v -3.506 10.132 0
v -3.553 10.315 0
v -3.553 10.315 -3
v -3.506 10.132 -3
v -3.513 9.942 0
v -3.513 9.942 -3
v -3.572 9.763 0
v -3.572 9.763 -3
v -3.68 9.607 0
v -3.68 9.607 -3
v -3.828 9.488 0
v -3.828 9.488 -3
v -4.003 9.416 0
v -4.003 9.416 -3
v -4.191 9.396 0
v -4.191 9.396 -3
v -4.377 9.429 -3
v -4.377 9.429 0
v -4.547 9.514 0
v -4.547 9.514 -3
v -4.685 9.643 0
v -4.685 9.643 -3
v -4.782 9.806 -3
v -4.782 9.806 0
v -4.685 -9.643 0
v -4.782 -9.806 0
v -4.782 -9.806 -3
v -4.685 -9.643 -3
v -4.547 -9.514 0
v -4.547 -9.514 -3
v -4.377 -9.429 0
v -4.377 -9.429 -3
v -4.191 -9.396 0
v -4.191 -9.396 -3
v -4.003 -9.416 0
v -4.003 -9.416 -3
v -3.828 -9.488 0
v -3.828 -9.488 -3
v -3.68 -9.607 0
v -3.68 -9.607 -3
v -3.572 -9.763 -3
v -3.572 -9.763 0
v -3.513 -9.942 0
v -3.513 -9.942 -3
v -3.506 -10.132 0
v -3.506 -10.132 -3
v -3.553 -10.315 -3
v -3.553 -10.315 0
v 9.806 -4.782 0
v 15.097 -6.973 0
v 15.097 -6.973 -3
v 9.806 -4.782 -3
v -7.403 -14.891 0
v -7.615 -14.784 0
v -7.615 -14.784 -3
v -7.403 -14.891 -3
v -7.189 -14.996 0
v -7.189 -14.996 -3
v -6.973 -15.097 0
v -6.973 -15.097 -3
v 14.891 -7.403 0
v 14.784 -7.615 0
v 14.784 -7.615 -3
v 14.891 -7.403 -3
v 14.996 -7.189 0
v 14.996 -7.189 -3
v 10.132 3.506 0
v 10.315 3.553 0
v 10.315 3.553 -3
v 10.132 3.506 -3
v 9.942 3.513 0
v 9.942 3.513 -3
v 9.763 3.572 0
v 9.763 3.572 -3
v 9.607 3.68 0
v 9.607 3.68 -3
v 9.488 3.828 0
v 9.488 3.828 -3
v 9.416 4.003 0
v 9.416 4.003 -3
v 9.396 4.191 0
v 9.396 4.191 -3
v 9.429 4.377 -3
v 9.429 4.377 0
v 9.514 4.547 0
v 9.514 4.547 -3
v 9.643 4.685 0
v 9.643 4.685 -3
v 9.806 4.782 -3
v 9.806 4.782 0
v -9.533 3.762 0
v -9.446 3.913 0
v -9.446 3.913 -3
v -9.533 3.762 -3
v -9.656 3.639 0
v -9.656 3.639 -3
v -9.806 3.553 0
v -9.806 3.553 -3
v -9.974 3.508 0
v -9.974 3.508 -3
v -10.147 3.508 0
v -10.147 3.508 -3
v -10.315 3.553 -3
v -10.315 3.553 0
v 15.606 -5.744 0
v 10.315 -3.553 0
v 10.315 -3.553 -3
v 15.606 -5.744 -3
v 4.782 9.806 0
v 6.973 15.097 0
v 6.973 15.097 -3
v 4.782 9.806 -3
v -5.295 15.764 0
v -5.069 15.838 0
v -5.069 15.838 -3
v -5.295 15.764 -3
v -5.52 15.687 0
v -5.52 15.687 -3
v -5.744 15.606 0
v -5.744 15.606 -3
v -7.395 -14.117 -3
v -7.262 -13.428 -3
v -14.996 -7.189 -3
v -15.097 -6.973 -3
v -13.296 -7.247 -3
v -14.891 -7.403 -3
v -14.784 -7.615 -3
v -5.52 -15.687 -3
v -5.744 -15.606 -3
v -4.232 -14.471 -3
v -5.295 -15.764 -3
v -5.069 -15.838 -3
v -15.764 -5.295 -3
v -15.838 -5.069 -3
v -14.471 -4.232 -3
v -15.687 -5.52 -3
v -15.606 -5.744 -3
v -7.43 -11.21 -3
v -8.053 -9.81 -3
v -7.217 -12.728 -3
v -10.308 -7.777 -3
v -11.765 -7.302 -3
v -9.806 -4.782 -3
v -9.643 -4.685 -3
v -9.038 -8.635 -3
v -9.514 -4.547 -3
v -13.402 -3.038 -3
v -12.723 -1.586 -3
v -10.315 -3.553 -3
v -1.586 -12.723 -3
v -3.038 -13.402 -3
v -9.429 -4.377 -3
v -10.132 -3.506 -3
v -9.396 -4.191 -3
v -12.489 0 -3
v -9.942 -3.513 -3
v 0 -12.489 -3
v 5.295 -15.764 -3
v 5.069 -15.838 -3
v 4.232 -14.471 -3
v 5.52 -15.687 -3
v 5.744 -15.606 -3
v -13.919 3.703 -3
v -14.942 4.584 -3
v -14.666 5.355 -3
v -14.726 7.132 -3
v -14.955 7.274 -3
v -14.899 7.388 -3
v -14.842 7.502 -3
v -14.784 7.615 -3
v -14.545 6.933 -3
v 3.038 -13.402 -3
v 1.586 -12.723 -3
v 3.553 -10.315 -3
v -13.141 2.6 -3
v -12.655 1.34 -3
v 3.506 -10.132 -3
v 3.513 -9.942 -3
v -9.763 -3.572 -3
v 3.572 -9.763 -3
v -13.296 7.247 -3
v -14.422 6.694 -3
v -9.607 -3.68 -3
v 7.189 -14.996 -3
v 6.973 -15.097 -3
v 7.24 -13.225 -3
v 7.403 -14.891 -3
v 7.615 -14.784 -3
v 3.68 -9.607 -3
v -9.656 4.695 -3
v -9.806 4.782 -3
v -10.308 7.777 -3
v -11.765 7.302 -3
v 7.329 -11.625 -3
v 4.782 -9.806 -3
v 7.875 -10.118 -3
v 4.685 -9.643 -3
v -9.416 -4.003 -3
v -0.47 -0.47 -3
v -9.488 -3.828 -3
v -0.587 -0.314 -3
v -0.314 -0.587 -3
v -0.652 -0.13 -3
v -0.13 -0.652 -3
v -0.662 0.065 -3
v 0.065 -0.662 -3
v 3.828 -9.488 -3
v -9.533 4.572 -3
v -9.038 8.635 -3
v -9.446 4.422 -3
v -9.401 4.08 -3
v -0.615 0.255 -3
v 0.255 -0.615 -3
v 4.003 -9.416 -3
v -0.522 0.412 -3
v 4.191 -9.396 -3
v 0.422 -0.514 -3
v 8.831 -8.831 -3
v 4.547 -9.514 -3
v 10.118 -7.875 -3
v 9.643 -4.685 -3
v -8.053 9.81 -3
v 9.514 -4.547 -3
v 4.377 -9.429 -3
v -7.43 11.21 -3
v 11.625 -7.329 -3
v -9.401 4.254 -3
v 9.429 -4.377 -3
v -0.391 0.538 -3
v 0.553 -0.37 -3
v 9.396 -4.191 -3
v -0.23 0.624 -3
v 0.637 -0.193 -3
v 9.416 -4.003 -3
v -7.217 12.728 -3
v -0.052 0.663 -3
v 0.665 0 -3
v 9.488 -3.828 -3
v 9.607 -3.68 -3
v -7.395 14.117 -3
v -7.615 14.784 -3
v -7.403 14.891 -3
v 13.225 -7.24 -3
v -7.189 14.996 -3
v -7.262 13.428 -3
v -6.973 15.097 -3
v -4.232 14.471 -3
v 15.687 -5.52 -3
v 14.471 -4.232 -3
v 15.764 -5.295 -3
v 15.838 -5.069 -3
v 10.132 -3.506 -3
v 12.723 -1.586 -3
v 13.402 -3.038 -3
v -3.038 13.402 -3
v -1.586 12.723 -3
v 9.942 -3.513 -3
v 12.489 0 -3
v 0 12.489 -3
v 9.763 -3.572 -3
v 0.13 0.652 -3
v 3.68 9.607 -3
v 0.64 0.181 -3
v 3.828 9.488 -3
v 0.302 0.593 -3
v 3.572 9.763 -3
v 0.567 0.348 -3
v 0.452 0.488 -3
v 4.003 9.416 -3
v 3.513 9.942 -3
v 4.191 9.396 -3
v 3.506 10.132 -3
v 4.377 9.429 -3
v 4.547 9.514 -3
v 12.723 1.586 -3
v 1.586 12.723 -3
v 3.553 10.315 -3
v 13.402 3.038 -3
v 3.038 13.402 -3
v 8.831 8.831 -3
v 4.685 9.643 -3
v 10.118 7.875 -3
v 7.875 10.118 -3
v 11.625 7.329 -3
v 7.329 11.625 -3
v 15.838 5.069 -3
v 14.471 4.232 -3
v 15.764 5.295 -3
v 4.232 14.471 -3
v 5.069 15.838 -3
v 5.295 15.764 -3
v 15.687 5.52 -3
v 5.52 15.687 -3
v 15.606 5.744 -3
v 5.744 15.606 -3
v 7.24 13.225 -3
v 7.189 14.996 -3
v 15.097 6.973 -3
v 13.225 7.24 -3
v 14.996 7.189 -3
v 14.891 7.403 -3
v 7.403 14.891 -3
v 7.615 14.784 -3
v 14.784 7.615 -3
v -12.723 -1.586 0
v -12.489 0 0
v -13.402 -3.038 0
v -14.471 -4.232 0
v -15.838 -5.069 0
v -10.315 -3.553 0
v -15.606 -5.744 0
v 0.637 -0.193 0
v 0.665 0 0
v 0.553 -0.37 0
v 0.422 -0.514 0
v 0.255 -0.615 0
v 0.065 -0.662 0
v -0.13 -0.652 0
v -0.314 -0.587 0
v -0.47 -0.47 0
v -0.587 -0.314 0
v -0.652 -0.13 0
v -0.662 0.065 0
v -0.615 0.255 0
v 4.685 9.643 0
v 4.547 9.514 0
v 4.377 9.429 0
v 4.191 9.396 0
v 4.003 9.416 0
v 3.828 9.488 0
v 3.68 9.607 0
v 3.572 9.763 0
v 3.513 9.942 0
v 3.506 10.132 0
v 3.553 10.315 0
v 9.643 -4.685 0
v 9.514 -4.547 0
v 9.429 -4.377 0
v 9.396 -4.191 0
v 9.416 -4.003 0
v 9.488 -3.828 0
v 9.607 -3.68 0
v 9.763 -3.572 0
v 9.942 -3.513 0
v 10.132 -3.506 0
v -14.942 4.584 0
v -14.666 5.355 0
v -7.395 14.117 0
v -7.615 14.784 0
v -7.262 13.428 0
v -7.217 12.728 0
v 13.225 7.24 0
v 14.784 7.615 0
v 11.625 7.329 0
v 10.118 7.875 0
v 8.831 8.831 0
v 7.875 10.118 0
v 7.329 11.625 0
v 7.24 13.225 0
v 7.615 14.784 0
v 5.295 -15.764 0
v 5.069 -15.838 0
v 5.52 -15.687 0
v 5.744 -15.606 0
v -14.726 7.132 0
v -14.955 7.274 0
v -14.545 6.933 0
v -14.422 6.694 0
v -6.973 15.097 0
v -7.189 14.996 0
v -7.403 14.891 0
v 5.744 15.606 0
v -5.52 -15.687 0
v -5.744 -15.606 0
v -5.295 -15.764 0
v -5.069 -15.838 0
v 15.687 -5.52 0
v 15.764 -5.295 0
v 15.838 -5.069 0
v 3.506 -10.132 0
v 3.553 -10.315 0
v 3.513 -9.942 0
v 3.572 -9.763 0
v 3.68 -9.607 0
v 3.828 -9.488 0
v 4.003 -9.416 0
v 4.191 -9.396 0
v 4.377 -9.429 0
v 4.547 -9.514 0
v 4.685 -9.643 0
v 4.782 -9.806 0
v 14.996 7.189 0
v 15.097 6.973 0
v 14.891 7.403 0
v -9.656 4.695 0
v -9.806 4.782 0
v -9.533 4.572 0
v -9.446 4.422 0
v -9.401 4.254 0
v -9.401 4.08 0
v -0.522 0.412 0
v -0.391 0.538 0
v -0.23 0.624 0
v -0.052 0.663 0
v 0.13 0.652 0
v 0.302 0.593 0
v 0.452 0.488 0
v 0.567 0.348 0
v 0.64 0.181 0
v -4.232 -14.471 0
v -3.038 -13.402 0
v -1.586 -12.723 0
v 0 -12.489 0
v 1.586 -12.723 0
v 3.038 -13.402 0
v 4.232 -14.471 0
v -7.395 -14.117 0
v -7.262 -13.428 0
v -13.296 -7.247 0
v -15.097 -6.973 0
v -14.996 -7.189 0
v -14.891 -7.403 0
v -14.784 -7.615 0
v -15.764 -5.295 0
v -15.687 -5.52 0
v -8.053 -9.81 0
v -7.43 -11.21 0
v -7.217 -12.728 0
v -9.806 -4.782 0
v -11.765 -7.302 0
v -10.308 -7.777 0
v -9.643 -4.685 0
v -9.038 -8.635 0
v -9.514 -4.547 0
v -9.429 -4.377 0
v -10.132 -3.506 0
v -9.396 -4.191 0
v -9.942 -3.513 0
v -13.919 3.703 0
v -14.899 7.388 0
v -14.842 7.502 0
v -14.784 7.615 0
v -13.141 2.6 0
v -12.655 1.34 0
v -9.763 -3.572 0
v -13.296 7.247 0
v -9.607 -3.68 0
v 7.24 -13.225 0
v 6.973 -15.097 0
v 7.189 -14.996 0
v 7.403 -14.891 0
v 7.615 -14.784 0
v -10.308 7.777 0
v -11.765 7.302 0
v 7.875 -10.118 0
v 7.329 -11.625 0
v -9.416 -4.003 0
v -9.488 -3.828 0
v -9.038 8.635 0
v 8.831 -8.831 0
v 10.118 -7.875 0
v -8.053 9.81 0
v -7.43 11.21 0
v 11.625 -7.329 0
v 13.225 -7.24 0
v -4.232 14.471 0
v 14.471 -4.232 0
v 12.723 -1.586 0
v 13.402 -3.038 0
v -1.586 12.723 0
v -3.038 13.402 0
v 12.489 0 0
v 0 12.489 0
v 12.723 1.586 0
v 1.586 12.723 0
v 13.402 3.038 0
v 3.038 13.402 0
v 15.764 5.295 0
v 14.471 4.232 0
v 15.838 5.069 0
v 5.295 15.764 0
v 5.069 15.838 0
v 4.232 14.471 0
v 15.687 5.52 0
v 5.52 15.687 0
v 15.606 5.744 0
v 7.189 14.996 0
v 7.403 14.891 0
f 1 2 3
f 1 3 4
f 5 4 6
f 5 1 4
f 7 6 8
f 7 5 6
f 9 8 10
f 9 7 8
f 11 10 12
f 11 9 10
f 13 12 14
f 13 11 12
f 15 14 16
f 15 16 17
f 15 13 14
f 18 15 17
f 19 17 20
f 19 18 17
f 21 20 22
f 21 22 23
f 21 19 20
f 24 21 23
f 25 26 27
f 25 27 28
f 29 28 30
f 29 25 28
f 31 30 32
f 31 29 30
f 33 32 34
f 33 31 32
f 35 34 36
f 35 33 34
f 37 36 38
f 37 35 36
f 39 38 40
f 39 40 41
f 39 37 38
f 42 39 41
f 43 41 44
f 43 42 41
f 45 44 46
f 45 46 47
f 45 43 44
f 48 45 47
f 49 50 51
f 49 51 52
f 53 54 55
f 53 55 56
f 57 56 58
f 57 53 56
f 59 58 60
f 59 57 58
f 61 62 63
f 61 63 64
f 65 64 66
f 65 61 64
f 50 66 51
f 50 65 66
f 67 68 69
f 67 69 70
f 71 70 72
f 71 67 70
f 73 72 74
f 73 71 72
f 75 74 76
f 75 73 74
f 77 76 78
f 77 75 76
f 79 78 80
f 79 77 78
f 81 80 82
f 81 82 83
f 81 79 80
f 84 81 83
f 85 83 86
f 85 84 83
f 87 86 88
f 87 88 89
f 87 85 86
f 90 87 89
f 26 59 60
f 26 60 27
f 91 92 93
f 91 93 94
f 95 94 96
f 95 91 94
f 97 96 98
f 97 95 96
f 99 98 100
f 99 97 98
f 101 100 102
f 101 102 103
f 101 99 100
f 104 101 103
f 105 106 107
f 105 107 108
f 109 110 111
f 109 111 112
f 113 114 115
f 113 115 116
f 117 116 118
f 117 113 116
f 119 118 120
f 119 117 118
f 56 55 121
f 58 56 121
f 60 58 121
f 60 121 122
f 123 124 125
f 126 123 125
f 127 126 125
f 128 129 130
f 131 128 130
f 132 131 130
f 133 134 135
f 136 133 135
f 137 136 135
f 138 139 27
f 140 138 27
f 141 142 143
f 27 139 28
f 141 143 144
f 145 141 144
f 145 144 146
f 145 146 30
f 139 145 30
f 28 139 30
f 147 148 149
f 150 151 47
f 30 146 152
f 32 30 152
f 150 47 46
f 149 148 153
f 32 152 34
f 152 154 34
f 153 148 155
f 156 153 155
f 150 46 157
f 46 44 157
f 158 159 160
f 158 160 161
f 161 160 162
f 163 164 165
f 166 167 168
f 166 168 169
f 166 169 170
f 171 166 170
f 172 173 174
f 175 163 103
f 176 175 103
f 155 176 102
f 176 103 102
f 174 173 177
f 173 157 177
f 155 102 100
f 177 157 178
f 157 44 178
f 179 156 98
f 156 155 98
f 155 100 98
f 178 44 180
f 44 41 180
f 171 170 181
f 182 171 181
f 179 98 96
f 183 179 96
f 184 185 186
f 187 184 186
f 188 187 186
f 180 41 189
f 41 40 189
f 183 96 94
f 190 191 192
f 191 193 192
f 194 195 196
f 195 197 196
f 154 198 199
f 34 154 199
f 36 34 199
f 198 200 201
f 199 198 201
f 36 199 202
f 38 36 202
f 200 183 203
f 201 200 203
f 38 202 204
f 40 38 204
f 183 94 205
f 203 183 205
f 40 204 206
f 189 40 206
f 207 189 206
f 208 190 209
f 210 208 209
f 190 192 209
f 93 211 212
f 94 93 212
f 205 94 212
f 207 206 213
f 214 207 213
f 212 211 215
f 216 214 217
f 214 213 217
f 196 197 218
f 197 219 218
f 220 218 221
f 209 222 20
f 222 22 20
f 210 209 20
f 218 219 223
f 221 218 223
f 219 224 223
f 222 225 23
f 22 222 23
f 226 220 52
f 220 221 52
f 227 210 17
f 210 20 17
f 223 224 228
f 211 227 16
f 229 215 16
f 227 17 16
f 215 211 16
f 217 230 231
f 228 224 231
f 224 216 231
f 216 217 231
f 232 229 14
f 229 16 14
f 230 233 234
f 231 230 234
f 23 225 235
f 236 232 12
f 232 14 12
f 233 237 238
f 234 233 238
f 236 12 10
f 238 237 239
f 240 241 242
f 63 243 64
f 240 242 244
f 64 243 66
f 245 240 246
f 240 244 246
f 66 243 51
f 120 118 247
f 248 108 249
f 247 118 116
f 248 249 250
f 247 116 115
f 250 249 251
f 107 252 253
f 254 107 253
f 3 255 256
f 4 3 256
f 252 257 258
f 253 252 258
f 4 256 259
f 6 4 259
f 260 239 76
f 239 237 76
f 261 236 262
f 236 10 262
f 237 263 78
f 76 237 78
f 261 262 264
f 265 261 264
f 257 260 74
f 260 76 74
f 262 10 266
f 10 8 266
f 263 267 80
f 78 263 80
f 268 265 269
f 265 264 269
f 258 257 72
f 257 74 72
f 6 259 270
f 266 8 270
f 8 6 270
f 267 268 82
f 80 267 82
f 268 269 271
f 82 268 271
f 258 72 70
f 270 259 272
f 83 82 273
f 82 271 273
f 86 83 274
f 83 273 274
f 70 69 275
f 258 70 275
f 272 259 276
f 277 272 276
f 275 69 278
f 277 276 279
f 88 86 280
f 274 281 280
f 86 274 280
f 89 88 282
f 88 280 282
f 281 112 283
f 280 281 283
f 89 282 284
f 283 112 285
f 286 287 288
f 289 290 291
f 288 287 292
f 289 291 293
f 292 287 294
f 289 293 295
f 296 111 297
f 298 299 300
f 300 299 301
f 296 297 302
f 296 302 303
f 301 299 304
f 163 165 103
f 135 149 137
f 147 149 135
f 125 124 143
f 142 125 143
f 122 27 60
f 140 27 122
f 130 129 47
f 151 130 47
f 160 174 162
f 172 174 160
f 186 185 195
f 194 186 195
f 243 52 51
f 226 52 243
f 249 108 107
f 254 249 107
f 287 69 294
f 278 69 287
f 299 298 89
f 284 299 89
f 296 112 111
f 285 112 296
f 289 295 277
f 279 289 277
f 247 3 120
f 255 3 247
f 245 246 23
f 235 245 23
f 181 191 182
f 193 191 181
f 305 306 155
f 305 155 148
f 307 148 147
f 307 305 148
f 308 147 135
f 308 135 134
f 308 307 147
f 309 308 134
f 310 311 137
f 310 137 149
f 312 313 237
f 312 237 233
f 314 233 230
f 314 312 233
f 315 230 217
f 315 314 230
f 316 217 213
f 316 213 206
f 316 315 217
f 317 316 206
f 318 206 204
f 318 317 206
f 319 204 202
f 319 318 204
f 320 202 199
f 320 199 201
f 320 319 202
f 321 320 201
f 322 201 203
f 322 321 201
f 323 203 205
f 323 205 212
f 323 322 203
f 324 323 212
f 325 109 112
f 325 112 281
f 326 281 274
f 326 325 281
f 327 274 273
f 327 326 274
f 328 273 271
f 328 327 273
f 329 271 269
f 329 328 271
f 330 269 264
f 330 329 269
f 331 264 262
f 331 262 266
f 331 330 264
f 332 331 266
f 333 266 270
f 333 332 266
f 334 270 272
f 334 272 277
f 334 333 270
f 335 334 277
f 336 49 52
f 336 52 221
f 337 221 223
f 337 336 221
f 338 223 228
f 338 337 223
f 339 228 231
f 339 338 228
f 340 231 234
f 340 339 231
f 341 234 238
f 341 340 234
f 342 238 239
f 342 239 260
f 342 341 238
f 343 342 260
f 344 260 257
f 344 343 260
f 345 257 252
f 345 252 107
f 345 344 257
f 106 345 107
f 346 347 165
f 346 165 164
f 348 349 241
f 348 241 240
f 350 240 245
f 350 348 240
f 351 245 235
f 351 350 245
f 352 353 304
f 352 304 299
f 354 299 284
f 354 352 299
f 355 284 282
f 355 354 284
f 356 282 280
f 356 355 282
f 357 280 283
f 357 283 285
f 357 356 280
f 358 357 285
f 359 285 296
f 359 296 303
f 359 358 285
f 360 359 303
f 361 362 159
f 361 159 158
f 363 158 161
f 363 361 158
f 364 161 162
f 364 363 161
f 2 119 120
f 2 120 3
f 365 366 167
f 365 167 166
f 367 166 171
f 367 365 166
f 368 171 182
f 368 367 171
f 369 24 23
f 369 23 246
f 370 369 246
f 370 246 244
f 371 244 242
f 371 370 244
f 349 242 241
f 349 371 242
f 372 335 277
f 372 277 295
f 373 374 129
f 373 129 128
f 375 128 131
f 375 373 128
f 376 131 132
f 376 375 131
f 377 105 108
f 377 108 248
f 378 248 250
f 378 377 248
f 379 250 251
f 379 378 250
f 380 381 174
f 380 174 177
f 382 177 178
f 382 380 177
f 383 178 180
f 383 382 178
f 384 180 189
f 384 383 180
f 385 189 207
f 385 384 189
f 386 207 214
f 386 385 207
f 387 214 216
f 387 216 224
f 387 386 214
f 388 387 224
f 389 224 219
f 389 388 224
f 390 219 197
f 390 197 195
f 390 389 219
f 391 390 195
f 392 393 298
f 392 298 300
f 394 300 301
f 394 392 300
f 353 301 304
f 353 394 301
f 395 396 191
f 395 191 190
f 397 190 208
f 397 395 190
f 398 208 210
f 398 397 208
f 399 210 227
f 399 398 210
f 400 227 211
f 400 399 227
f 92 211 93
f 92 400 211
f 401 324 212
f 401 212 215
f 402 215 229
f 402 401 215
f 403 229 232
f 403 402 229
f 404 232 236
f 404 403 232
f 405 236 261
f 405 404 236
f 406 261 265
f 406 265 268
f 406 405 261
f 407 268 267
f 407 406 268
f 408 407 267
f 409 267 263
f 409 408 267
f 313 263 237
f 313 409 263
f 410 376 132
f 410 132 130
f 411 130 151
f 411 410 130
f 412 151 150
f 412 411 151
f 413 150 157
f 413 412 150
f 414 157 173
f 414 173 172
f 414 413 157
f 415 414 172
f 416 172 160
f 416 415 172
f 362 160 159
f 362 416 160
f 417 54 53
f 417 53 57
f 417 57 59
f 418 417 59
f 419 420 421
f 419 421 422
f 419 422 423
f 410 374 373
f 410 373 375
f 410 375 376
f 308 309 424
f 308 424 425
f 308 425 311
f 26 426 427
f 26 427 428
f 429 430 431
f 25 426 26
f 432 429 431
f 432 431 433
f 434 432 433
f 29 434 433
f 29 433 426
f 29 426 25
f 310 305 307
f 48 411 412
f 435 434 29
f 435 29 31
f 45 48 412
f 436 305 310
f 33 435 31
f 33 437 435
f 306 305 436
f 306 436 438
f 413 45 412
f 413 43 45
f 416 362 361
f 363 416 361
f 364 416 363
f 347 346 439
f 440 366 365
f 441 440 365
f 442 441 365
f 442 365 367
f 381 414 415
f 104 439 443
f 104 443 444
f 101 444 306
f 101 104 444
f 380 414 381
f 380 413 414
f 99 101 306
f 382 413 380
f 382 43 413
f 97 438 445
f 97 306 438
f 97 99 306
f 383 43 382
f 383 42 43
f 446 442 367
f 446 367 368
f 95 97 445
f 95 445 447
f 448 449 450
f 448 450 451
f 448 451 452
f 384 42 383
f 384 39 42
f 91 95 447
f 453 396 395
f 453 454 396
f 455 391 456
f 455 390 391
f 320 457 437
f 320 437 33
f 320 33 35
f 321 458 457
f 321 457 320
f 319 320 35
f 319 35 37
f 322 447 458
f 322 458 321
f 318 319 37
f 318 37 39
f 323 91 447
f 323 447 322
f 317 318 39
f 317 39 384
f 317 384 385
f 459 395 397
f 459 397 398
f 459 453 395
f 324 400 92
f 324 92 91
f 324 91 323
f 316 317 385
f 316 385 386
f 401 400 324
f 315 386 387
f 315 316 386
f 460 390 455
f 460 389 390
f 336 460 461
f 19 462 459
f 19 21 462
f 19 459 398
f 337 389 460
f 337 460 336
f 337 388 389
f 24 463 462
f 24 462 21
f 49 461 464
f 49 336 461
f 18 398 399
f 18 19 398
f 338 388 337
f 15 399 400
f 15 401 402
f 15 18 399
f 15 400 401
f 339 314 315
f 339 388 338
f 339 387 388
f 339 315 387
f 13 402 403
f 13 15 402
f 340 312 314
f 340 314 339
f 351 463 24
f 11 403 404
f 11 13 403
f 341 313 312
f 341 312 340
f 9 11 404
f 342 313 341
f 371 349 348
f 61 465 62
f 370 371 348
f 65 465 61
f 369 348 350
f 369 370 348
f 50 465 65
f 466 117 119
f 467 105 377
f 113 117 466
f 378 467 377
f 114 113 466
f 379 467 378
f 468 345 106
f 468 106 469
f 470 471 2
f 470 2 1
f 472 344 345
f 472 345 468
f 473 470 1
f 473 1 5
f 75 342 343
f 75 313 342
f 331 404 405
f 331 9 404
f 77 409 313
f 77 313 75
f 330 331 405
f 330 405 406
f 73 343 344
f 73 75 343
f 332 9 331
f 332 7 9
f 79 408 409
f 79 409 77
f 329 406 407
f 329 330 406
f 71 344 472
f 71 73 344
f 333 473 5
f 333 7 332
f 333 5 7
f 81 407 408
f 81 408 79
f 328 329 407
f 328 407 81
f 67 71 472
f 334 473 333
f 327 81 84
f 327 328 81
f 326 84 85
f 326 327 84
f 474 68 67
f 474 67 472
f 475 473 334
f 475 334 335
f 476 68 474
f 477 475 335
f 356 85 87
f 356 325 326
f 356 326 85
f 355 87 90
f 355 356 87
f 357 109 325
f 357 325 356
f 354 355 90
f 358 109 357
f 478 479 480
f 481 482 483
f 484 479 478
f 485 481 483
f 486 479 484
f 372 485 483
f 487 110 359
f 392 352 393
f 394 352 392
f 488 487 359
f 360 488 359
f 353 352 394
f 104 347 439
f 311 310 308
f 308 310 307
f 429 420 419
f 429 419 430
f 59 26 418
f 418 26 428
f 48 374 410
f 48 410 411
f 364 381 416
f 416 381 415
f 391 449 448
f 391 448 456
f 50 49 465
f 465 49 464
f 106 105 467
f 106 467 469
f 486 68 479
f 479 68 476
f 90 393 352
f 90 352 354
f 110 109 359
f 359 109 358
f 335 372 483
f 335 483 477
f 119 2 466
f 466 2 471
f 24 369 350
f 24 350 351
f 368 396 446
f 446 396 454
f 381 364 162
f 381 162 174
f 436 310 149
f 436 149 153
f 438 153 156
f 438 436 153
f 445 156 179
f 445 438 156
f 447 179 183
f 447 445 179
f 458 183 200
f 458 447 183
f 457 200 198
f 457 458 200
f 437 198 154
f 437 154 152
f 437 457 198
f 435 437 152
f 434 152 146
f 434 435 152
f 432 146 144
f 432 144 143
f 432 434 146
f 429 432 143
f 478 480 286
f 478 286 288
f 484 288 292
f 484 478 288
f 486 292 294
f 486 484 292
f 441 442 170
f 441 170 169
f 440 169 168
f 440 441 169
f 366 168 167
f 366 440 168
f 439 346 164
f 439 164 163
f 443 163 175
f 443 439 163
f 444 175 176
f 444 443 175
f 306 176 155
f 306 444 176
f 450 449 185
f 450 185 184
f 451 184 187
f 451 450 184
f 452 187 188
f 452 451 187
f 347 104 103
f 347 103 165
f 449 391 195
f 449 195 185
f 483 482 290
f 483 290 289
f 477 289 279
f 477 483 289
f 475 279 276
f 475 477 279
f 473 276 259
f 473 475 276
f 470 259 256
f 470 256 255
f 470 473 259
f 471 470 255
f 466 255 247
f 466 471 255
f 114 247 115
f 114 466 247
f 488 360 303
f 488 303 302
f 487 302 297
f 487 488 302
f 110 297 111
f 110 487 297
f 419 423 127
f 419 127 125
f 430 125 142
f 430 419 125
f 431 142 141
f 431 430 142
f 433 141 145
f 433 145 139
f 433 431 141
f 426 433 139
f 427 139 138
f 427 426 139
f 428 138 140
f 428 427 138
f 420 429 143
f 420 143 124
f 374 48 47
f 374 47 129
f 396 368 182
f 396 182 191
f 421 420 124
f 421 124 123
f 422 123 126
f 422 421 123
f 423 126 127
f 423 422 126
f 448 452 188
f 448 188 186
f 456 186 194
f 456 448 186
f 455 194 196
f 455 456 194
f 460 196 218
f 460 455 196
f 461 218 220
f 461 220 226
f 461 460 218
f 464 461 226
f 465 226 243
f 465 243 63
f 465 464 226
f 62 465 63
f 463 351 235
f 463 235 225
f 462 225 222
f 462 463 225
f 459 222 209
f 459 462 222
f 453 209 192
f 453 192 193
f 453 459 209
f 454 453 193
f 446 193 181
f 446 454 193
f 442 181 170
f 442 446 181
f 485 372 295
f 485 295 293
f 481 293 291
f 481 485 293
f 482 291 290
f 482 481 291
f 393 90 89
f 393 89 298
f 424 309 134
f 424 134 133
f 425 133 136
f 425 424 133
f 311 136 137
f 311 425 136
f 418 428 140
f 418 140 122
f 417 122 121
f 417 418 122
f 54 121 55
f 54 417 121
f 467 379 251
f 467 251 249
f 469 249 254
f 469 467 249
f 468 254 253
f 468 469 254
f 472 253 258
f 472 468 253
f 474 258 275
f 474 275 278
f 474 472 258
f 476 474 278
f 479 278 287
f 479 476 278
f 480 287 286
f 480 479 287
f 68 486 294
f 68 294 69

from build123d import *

# Parameters (mm, degrees)
SALIENTE_EXTRUIR1_DEPTH = 3


with BuildPart() as part:
    # Croquis1 → Saliente-Extruir1 (new body)
    with BuildSketch(Plane.XY):
        with BuildLine():
            ThreePointArc((-9.805994702, 4.781775998), (-9.445994702, 4.421775998), (-9.445994702, 3.912659116))
            ThreePointArc((-9.445994702, 3.912659116), (-9.805994702, 3.552659116), (-10.315111585, 3.552659116))
            Line((-10.315111585, 3.552659116), (-14.665897198, 5.354813524))
            Line((-14.665897198, 5.354813524), (-14.942220541, 4.584446936))
            ThreePointArc((-14.942220541, 4.584446936), (-13.141116636, 2.599696402), (-12.489358574, 0))
            ThreePointArc((-12.489358574, 0), (-13.40224475, -3.037731981), (-15.838448045, -5.06900997))
            ThreePointArc((-15.838448045, -5.06900997), (-15.725960944, -5.407906335), (-15.606223383, -5.744309383))
            Line((-15.606223383, -5.744309383), (-10.315111585, -3.552659116))
            ThreePointArc((-10.315111585, -3.552659116), (-9.445994702, -3.912659116), (-9.805994702, -4.781775998))
            Line((-9.805994702, -4.781775998), (-15.0971065, -6.973426265))
            ThreePointArc((-15.0971065, -6.973426265), (-14.943900866, -7.295966383), (-14.78380534, -7.615142693))
            ThreePointArc((-14.78380534, -7.615142693), (-9.642639792, -8.161938898), (-7.217280635, -12.727922061))
            ThreePointArc((-7.217280635, -12.727922061), (-7.317660389, -13.774935704), (-7.615142693, -14.78380534))
            ThreePointArc((-7.615142693, -14.78380534), (-7.295966383, -14.943900866), (-6.973426265, -15.0971065))
            Line((-6.973426265, -15.0971065), (-4.781775998, -9.805994702))
            ThreePointArc((-4.781775998, -9.805994702), (-3.912659116, -9.445994702), (-3.552659116, -10.315111585))
            Line((-3.552659116, -10.315111585), (-5.744309383, -15.606223383))
            ThreePointArc((-5.744309383, -15.606223383), (-5.407906335, -15.725960944), (-5.06900997, -15.838448045))
            ThreePointArc((-5.06900997, -15.838448045), (0, -12.489358574), (5.06900997, -15.838448045))
            ThreePointArc((5.06900997, -15.838448045), (5.407906335, -15.725960944), (5.744309383, -15.606223383))
            Line((5.744309383, -15.606223383), (3.552659116, -10.315111585))
            ThreePointArc((3.552659116, -10.315111585), (3.912659116, -9.445994702), (4.781775998, -9.805994702))
            Line((4.781775998, -9.805994702), (6.973426265, -15.0971065))
            ThreePointArc((6.973426265, -15.0971065), (7.295966383, -14.943900866), (7.615142693, -14.78380534))
            ThreePointArc((7.615142693, -14.78380534), (8.83131014, -8.83131014), (14.78380534, -7.615142693))
            ThreePointArc((14.78380534, -7.615142693), (14.943900866, -7.295966383), (15.0971065, -6.973426265))
            Line((15.0971065, -6.973426265), (9.805994702, -4.781775998))
            ThreePointArc((9.805994702, -4.781775998), (9.445994702, -3.912659116), (10.315111585, -3.552659116))
            Line((10.315111585, -3.552659116), (15.606223383, -5.744309383))
            ThreePointArc((15.606223383, -5.744309383), (15.725960944, -5.407906335), (15.838448045, -5.06900997))
            ThreePointArc((15.838448045, -5.06900997), (12.489358574, 0), (15.838448045, 5.06900997))
            ThreePointArc((15.838448045, 5.06900997), (15.725960944, 5.407906335), (15.606223383, 5.744309383))
            Line((15.606223383, 5.744309383), (10.315111585, 3.552659116))
            ThreePointArc((10.315111585, 3.552659116), (9.445994702, 3.912659116), (9.805994702, 4.781775998))
            Line((9.805994702, 4.781775998), (15.0971065, 6.973426265))
            ThreePointArc((15.0971065, 6.973426265), (14.943900866, 7.295966383), (14.78380534, 7.615142693))
            ThreePointArc((14.78380534, 7.615142693), (8.83131014, 8.83131014), (7.615142693, 14.78380534))
            ThreePointArc((7.615142693, 14.78380534), (7.295966383, 14.943900866), (6.973426265, 15.0971065))
            Line((6.973426265, 15.0971065), (4.781775998, 9.805994702))
            ThreePointArc((4.781775998, 9.805994702), (3.912659116, 9.445994702), (3.552659116, 10.315111585))
            Line((3.552659116, 10.315111585), (5.744309383, 15.606223383))
            ThreePointArc((5.744309383, 15.606223383), (5.407906335, 15.725960944), (5.06900997, 15.838448045))
            ThreePointArc((5.06900997, 15.838448045), (0, 12.489358574), (-5.06900997, 15.838448045))
            ThreePointArc((-5.06900997, 15.838448045), (-5.407906335, 15.725960944), (-5.744309383, 15.606223383))
            Line((-5.744309383, 15.606223383), (-3.552659116, 10.315111585))
            ThreePointArc((-3.552659116, 10.315111585), (-3.912659116, 9.445994702), (-4.781775998, 9.805994702))
            Line((-4.781775998, 9.805994702), (-6.973426265, 15.0971065))
            ThreePointArc((-6.973426265, 15.0971065), (-7.295966383, 14.943900866), (-7.615142693, 14.78380534))
            ThreePointArc((-7.615142693, 14.78380534), (-7.317660389, 13.774935704), (-7.217280635, 12.727922061))
            ThreePointArc((-7.217280635, 12.727922061), (-9.642639792, 8.161938898), (-14.78380534, 7.615142693))
            ThreePointArc((-14.78380534, 7.615142693), (-14.870201448, 7.445025684), (-14.954640105, 7.273928642))
            ThreePointArc((-14.954640105, 7.273928642), (-14.628849784, 7.038643274), (-14.422305364, 6.693914482))
            Line((-14.422305364, 6.693914482), (-9.805994702, 4.781775998))
        make_face()
        with BuildLine():
            ThreePointArc((0.665193263, 0), (-0.129772768, -0.652411761), (-0.614558441, 0.254558441))
            ThreePointArc((-0.614558441, 0.254558441), (0.129772768, 0.652411761), (0.665193263, 0))
        make_face(mode=Mode.SUBTRACT)
    extrude(amount=-SALIENTE_EXTRUIR1_DEPTH)


solid = part.part
